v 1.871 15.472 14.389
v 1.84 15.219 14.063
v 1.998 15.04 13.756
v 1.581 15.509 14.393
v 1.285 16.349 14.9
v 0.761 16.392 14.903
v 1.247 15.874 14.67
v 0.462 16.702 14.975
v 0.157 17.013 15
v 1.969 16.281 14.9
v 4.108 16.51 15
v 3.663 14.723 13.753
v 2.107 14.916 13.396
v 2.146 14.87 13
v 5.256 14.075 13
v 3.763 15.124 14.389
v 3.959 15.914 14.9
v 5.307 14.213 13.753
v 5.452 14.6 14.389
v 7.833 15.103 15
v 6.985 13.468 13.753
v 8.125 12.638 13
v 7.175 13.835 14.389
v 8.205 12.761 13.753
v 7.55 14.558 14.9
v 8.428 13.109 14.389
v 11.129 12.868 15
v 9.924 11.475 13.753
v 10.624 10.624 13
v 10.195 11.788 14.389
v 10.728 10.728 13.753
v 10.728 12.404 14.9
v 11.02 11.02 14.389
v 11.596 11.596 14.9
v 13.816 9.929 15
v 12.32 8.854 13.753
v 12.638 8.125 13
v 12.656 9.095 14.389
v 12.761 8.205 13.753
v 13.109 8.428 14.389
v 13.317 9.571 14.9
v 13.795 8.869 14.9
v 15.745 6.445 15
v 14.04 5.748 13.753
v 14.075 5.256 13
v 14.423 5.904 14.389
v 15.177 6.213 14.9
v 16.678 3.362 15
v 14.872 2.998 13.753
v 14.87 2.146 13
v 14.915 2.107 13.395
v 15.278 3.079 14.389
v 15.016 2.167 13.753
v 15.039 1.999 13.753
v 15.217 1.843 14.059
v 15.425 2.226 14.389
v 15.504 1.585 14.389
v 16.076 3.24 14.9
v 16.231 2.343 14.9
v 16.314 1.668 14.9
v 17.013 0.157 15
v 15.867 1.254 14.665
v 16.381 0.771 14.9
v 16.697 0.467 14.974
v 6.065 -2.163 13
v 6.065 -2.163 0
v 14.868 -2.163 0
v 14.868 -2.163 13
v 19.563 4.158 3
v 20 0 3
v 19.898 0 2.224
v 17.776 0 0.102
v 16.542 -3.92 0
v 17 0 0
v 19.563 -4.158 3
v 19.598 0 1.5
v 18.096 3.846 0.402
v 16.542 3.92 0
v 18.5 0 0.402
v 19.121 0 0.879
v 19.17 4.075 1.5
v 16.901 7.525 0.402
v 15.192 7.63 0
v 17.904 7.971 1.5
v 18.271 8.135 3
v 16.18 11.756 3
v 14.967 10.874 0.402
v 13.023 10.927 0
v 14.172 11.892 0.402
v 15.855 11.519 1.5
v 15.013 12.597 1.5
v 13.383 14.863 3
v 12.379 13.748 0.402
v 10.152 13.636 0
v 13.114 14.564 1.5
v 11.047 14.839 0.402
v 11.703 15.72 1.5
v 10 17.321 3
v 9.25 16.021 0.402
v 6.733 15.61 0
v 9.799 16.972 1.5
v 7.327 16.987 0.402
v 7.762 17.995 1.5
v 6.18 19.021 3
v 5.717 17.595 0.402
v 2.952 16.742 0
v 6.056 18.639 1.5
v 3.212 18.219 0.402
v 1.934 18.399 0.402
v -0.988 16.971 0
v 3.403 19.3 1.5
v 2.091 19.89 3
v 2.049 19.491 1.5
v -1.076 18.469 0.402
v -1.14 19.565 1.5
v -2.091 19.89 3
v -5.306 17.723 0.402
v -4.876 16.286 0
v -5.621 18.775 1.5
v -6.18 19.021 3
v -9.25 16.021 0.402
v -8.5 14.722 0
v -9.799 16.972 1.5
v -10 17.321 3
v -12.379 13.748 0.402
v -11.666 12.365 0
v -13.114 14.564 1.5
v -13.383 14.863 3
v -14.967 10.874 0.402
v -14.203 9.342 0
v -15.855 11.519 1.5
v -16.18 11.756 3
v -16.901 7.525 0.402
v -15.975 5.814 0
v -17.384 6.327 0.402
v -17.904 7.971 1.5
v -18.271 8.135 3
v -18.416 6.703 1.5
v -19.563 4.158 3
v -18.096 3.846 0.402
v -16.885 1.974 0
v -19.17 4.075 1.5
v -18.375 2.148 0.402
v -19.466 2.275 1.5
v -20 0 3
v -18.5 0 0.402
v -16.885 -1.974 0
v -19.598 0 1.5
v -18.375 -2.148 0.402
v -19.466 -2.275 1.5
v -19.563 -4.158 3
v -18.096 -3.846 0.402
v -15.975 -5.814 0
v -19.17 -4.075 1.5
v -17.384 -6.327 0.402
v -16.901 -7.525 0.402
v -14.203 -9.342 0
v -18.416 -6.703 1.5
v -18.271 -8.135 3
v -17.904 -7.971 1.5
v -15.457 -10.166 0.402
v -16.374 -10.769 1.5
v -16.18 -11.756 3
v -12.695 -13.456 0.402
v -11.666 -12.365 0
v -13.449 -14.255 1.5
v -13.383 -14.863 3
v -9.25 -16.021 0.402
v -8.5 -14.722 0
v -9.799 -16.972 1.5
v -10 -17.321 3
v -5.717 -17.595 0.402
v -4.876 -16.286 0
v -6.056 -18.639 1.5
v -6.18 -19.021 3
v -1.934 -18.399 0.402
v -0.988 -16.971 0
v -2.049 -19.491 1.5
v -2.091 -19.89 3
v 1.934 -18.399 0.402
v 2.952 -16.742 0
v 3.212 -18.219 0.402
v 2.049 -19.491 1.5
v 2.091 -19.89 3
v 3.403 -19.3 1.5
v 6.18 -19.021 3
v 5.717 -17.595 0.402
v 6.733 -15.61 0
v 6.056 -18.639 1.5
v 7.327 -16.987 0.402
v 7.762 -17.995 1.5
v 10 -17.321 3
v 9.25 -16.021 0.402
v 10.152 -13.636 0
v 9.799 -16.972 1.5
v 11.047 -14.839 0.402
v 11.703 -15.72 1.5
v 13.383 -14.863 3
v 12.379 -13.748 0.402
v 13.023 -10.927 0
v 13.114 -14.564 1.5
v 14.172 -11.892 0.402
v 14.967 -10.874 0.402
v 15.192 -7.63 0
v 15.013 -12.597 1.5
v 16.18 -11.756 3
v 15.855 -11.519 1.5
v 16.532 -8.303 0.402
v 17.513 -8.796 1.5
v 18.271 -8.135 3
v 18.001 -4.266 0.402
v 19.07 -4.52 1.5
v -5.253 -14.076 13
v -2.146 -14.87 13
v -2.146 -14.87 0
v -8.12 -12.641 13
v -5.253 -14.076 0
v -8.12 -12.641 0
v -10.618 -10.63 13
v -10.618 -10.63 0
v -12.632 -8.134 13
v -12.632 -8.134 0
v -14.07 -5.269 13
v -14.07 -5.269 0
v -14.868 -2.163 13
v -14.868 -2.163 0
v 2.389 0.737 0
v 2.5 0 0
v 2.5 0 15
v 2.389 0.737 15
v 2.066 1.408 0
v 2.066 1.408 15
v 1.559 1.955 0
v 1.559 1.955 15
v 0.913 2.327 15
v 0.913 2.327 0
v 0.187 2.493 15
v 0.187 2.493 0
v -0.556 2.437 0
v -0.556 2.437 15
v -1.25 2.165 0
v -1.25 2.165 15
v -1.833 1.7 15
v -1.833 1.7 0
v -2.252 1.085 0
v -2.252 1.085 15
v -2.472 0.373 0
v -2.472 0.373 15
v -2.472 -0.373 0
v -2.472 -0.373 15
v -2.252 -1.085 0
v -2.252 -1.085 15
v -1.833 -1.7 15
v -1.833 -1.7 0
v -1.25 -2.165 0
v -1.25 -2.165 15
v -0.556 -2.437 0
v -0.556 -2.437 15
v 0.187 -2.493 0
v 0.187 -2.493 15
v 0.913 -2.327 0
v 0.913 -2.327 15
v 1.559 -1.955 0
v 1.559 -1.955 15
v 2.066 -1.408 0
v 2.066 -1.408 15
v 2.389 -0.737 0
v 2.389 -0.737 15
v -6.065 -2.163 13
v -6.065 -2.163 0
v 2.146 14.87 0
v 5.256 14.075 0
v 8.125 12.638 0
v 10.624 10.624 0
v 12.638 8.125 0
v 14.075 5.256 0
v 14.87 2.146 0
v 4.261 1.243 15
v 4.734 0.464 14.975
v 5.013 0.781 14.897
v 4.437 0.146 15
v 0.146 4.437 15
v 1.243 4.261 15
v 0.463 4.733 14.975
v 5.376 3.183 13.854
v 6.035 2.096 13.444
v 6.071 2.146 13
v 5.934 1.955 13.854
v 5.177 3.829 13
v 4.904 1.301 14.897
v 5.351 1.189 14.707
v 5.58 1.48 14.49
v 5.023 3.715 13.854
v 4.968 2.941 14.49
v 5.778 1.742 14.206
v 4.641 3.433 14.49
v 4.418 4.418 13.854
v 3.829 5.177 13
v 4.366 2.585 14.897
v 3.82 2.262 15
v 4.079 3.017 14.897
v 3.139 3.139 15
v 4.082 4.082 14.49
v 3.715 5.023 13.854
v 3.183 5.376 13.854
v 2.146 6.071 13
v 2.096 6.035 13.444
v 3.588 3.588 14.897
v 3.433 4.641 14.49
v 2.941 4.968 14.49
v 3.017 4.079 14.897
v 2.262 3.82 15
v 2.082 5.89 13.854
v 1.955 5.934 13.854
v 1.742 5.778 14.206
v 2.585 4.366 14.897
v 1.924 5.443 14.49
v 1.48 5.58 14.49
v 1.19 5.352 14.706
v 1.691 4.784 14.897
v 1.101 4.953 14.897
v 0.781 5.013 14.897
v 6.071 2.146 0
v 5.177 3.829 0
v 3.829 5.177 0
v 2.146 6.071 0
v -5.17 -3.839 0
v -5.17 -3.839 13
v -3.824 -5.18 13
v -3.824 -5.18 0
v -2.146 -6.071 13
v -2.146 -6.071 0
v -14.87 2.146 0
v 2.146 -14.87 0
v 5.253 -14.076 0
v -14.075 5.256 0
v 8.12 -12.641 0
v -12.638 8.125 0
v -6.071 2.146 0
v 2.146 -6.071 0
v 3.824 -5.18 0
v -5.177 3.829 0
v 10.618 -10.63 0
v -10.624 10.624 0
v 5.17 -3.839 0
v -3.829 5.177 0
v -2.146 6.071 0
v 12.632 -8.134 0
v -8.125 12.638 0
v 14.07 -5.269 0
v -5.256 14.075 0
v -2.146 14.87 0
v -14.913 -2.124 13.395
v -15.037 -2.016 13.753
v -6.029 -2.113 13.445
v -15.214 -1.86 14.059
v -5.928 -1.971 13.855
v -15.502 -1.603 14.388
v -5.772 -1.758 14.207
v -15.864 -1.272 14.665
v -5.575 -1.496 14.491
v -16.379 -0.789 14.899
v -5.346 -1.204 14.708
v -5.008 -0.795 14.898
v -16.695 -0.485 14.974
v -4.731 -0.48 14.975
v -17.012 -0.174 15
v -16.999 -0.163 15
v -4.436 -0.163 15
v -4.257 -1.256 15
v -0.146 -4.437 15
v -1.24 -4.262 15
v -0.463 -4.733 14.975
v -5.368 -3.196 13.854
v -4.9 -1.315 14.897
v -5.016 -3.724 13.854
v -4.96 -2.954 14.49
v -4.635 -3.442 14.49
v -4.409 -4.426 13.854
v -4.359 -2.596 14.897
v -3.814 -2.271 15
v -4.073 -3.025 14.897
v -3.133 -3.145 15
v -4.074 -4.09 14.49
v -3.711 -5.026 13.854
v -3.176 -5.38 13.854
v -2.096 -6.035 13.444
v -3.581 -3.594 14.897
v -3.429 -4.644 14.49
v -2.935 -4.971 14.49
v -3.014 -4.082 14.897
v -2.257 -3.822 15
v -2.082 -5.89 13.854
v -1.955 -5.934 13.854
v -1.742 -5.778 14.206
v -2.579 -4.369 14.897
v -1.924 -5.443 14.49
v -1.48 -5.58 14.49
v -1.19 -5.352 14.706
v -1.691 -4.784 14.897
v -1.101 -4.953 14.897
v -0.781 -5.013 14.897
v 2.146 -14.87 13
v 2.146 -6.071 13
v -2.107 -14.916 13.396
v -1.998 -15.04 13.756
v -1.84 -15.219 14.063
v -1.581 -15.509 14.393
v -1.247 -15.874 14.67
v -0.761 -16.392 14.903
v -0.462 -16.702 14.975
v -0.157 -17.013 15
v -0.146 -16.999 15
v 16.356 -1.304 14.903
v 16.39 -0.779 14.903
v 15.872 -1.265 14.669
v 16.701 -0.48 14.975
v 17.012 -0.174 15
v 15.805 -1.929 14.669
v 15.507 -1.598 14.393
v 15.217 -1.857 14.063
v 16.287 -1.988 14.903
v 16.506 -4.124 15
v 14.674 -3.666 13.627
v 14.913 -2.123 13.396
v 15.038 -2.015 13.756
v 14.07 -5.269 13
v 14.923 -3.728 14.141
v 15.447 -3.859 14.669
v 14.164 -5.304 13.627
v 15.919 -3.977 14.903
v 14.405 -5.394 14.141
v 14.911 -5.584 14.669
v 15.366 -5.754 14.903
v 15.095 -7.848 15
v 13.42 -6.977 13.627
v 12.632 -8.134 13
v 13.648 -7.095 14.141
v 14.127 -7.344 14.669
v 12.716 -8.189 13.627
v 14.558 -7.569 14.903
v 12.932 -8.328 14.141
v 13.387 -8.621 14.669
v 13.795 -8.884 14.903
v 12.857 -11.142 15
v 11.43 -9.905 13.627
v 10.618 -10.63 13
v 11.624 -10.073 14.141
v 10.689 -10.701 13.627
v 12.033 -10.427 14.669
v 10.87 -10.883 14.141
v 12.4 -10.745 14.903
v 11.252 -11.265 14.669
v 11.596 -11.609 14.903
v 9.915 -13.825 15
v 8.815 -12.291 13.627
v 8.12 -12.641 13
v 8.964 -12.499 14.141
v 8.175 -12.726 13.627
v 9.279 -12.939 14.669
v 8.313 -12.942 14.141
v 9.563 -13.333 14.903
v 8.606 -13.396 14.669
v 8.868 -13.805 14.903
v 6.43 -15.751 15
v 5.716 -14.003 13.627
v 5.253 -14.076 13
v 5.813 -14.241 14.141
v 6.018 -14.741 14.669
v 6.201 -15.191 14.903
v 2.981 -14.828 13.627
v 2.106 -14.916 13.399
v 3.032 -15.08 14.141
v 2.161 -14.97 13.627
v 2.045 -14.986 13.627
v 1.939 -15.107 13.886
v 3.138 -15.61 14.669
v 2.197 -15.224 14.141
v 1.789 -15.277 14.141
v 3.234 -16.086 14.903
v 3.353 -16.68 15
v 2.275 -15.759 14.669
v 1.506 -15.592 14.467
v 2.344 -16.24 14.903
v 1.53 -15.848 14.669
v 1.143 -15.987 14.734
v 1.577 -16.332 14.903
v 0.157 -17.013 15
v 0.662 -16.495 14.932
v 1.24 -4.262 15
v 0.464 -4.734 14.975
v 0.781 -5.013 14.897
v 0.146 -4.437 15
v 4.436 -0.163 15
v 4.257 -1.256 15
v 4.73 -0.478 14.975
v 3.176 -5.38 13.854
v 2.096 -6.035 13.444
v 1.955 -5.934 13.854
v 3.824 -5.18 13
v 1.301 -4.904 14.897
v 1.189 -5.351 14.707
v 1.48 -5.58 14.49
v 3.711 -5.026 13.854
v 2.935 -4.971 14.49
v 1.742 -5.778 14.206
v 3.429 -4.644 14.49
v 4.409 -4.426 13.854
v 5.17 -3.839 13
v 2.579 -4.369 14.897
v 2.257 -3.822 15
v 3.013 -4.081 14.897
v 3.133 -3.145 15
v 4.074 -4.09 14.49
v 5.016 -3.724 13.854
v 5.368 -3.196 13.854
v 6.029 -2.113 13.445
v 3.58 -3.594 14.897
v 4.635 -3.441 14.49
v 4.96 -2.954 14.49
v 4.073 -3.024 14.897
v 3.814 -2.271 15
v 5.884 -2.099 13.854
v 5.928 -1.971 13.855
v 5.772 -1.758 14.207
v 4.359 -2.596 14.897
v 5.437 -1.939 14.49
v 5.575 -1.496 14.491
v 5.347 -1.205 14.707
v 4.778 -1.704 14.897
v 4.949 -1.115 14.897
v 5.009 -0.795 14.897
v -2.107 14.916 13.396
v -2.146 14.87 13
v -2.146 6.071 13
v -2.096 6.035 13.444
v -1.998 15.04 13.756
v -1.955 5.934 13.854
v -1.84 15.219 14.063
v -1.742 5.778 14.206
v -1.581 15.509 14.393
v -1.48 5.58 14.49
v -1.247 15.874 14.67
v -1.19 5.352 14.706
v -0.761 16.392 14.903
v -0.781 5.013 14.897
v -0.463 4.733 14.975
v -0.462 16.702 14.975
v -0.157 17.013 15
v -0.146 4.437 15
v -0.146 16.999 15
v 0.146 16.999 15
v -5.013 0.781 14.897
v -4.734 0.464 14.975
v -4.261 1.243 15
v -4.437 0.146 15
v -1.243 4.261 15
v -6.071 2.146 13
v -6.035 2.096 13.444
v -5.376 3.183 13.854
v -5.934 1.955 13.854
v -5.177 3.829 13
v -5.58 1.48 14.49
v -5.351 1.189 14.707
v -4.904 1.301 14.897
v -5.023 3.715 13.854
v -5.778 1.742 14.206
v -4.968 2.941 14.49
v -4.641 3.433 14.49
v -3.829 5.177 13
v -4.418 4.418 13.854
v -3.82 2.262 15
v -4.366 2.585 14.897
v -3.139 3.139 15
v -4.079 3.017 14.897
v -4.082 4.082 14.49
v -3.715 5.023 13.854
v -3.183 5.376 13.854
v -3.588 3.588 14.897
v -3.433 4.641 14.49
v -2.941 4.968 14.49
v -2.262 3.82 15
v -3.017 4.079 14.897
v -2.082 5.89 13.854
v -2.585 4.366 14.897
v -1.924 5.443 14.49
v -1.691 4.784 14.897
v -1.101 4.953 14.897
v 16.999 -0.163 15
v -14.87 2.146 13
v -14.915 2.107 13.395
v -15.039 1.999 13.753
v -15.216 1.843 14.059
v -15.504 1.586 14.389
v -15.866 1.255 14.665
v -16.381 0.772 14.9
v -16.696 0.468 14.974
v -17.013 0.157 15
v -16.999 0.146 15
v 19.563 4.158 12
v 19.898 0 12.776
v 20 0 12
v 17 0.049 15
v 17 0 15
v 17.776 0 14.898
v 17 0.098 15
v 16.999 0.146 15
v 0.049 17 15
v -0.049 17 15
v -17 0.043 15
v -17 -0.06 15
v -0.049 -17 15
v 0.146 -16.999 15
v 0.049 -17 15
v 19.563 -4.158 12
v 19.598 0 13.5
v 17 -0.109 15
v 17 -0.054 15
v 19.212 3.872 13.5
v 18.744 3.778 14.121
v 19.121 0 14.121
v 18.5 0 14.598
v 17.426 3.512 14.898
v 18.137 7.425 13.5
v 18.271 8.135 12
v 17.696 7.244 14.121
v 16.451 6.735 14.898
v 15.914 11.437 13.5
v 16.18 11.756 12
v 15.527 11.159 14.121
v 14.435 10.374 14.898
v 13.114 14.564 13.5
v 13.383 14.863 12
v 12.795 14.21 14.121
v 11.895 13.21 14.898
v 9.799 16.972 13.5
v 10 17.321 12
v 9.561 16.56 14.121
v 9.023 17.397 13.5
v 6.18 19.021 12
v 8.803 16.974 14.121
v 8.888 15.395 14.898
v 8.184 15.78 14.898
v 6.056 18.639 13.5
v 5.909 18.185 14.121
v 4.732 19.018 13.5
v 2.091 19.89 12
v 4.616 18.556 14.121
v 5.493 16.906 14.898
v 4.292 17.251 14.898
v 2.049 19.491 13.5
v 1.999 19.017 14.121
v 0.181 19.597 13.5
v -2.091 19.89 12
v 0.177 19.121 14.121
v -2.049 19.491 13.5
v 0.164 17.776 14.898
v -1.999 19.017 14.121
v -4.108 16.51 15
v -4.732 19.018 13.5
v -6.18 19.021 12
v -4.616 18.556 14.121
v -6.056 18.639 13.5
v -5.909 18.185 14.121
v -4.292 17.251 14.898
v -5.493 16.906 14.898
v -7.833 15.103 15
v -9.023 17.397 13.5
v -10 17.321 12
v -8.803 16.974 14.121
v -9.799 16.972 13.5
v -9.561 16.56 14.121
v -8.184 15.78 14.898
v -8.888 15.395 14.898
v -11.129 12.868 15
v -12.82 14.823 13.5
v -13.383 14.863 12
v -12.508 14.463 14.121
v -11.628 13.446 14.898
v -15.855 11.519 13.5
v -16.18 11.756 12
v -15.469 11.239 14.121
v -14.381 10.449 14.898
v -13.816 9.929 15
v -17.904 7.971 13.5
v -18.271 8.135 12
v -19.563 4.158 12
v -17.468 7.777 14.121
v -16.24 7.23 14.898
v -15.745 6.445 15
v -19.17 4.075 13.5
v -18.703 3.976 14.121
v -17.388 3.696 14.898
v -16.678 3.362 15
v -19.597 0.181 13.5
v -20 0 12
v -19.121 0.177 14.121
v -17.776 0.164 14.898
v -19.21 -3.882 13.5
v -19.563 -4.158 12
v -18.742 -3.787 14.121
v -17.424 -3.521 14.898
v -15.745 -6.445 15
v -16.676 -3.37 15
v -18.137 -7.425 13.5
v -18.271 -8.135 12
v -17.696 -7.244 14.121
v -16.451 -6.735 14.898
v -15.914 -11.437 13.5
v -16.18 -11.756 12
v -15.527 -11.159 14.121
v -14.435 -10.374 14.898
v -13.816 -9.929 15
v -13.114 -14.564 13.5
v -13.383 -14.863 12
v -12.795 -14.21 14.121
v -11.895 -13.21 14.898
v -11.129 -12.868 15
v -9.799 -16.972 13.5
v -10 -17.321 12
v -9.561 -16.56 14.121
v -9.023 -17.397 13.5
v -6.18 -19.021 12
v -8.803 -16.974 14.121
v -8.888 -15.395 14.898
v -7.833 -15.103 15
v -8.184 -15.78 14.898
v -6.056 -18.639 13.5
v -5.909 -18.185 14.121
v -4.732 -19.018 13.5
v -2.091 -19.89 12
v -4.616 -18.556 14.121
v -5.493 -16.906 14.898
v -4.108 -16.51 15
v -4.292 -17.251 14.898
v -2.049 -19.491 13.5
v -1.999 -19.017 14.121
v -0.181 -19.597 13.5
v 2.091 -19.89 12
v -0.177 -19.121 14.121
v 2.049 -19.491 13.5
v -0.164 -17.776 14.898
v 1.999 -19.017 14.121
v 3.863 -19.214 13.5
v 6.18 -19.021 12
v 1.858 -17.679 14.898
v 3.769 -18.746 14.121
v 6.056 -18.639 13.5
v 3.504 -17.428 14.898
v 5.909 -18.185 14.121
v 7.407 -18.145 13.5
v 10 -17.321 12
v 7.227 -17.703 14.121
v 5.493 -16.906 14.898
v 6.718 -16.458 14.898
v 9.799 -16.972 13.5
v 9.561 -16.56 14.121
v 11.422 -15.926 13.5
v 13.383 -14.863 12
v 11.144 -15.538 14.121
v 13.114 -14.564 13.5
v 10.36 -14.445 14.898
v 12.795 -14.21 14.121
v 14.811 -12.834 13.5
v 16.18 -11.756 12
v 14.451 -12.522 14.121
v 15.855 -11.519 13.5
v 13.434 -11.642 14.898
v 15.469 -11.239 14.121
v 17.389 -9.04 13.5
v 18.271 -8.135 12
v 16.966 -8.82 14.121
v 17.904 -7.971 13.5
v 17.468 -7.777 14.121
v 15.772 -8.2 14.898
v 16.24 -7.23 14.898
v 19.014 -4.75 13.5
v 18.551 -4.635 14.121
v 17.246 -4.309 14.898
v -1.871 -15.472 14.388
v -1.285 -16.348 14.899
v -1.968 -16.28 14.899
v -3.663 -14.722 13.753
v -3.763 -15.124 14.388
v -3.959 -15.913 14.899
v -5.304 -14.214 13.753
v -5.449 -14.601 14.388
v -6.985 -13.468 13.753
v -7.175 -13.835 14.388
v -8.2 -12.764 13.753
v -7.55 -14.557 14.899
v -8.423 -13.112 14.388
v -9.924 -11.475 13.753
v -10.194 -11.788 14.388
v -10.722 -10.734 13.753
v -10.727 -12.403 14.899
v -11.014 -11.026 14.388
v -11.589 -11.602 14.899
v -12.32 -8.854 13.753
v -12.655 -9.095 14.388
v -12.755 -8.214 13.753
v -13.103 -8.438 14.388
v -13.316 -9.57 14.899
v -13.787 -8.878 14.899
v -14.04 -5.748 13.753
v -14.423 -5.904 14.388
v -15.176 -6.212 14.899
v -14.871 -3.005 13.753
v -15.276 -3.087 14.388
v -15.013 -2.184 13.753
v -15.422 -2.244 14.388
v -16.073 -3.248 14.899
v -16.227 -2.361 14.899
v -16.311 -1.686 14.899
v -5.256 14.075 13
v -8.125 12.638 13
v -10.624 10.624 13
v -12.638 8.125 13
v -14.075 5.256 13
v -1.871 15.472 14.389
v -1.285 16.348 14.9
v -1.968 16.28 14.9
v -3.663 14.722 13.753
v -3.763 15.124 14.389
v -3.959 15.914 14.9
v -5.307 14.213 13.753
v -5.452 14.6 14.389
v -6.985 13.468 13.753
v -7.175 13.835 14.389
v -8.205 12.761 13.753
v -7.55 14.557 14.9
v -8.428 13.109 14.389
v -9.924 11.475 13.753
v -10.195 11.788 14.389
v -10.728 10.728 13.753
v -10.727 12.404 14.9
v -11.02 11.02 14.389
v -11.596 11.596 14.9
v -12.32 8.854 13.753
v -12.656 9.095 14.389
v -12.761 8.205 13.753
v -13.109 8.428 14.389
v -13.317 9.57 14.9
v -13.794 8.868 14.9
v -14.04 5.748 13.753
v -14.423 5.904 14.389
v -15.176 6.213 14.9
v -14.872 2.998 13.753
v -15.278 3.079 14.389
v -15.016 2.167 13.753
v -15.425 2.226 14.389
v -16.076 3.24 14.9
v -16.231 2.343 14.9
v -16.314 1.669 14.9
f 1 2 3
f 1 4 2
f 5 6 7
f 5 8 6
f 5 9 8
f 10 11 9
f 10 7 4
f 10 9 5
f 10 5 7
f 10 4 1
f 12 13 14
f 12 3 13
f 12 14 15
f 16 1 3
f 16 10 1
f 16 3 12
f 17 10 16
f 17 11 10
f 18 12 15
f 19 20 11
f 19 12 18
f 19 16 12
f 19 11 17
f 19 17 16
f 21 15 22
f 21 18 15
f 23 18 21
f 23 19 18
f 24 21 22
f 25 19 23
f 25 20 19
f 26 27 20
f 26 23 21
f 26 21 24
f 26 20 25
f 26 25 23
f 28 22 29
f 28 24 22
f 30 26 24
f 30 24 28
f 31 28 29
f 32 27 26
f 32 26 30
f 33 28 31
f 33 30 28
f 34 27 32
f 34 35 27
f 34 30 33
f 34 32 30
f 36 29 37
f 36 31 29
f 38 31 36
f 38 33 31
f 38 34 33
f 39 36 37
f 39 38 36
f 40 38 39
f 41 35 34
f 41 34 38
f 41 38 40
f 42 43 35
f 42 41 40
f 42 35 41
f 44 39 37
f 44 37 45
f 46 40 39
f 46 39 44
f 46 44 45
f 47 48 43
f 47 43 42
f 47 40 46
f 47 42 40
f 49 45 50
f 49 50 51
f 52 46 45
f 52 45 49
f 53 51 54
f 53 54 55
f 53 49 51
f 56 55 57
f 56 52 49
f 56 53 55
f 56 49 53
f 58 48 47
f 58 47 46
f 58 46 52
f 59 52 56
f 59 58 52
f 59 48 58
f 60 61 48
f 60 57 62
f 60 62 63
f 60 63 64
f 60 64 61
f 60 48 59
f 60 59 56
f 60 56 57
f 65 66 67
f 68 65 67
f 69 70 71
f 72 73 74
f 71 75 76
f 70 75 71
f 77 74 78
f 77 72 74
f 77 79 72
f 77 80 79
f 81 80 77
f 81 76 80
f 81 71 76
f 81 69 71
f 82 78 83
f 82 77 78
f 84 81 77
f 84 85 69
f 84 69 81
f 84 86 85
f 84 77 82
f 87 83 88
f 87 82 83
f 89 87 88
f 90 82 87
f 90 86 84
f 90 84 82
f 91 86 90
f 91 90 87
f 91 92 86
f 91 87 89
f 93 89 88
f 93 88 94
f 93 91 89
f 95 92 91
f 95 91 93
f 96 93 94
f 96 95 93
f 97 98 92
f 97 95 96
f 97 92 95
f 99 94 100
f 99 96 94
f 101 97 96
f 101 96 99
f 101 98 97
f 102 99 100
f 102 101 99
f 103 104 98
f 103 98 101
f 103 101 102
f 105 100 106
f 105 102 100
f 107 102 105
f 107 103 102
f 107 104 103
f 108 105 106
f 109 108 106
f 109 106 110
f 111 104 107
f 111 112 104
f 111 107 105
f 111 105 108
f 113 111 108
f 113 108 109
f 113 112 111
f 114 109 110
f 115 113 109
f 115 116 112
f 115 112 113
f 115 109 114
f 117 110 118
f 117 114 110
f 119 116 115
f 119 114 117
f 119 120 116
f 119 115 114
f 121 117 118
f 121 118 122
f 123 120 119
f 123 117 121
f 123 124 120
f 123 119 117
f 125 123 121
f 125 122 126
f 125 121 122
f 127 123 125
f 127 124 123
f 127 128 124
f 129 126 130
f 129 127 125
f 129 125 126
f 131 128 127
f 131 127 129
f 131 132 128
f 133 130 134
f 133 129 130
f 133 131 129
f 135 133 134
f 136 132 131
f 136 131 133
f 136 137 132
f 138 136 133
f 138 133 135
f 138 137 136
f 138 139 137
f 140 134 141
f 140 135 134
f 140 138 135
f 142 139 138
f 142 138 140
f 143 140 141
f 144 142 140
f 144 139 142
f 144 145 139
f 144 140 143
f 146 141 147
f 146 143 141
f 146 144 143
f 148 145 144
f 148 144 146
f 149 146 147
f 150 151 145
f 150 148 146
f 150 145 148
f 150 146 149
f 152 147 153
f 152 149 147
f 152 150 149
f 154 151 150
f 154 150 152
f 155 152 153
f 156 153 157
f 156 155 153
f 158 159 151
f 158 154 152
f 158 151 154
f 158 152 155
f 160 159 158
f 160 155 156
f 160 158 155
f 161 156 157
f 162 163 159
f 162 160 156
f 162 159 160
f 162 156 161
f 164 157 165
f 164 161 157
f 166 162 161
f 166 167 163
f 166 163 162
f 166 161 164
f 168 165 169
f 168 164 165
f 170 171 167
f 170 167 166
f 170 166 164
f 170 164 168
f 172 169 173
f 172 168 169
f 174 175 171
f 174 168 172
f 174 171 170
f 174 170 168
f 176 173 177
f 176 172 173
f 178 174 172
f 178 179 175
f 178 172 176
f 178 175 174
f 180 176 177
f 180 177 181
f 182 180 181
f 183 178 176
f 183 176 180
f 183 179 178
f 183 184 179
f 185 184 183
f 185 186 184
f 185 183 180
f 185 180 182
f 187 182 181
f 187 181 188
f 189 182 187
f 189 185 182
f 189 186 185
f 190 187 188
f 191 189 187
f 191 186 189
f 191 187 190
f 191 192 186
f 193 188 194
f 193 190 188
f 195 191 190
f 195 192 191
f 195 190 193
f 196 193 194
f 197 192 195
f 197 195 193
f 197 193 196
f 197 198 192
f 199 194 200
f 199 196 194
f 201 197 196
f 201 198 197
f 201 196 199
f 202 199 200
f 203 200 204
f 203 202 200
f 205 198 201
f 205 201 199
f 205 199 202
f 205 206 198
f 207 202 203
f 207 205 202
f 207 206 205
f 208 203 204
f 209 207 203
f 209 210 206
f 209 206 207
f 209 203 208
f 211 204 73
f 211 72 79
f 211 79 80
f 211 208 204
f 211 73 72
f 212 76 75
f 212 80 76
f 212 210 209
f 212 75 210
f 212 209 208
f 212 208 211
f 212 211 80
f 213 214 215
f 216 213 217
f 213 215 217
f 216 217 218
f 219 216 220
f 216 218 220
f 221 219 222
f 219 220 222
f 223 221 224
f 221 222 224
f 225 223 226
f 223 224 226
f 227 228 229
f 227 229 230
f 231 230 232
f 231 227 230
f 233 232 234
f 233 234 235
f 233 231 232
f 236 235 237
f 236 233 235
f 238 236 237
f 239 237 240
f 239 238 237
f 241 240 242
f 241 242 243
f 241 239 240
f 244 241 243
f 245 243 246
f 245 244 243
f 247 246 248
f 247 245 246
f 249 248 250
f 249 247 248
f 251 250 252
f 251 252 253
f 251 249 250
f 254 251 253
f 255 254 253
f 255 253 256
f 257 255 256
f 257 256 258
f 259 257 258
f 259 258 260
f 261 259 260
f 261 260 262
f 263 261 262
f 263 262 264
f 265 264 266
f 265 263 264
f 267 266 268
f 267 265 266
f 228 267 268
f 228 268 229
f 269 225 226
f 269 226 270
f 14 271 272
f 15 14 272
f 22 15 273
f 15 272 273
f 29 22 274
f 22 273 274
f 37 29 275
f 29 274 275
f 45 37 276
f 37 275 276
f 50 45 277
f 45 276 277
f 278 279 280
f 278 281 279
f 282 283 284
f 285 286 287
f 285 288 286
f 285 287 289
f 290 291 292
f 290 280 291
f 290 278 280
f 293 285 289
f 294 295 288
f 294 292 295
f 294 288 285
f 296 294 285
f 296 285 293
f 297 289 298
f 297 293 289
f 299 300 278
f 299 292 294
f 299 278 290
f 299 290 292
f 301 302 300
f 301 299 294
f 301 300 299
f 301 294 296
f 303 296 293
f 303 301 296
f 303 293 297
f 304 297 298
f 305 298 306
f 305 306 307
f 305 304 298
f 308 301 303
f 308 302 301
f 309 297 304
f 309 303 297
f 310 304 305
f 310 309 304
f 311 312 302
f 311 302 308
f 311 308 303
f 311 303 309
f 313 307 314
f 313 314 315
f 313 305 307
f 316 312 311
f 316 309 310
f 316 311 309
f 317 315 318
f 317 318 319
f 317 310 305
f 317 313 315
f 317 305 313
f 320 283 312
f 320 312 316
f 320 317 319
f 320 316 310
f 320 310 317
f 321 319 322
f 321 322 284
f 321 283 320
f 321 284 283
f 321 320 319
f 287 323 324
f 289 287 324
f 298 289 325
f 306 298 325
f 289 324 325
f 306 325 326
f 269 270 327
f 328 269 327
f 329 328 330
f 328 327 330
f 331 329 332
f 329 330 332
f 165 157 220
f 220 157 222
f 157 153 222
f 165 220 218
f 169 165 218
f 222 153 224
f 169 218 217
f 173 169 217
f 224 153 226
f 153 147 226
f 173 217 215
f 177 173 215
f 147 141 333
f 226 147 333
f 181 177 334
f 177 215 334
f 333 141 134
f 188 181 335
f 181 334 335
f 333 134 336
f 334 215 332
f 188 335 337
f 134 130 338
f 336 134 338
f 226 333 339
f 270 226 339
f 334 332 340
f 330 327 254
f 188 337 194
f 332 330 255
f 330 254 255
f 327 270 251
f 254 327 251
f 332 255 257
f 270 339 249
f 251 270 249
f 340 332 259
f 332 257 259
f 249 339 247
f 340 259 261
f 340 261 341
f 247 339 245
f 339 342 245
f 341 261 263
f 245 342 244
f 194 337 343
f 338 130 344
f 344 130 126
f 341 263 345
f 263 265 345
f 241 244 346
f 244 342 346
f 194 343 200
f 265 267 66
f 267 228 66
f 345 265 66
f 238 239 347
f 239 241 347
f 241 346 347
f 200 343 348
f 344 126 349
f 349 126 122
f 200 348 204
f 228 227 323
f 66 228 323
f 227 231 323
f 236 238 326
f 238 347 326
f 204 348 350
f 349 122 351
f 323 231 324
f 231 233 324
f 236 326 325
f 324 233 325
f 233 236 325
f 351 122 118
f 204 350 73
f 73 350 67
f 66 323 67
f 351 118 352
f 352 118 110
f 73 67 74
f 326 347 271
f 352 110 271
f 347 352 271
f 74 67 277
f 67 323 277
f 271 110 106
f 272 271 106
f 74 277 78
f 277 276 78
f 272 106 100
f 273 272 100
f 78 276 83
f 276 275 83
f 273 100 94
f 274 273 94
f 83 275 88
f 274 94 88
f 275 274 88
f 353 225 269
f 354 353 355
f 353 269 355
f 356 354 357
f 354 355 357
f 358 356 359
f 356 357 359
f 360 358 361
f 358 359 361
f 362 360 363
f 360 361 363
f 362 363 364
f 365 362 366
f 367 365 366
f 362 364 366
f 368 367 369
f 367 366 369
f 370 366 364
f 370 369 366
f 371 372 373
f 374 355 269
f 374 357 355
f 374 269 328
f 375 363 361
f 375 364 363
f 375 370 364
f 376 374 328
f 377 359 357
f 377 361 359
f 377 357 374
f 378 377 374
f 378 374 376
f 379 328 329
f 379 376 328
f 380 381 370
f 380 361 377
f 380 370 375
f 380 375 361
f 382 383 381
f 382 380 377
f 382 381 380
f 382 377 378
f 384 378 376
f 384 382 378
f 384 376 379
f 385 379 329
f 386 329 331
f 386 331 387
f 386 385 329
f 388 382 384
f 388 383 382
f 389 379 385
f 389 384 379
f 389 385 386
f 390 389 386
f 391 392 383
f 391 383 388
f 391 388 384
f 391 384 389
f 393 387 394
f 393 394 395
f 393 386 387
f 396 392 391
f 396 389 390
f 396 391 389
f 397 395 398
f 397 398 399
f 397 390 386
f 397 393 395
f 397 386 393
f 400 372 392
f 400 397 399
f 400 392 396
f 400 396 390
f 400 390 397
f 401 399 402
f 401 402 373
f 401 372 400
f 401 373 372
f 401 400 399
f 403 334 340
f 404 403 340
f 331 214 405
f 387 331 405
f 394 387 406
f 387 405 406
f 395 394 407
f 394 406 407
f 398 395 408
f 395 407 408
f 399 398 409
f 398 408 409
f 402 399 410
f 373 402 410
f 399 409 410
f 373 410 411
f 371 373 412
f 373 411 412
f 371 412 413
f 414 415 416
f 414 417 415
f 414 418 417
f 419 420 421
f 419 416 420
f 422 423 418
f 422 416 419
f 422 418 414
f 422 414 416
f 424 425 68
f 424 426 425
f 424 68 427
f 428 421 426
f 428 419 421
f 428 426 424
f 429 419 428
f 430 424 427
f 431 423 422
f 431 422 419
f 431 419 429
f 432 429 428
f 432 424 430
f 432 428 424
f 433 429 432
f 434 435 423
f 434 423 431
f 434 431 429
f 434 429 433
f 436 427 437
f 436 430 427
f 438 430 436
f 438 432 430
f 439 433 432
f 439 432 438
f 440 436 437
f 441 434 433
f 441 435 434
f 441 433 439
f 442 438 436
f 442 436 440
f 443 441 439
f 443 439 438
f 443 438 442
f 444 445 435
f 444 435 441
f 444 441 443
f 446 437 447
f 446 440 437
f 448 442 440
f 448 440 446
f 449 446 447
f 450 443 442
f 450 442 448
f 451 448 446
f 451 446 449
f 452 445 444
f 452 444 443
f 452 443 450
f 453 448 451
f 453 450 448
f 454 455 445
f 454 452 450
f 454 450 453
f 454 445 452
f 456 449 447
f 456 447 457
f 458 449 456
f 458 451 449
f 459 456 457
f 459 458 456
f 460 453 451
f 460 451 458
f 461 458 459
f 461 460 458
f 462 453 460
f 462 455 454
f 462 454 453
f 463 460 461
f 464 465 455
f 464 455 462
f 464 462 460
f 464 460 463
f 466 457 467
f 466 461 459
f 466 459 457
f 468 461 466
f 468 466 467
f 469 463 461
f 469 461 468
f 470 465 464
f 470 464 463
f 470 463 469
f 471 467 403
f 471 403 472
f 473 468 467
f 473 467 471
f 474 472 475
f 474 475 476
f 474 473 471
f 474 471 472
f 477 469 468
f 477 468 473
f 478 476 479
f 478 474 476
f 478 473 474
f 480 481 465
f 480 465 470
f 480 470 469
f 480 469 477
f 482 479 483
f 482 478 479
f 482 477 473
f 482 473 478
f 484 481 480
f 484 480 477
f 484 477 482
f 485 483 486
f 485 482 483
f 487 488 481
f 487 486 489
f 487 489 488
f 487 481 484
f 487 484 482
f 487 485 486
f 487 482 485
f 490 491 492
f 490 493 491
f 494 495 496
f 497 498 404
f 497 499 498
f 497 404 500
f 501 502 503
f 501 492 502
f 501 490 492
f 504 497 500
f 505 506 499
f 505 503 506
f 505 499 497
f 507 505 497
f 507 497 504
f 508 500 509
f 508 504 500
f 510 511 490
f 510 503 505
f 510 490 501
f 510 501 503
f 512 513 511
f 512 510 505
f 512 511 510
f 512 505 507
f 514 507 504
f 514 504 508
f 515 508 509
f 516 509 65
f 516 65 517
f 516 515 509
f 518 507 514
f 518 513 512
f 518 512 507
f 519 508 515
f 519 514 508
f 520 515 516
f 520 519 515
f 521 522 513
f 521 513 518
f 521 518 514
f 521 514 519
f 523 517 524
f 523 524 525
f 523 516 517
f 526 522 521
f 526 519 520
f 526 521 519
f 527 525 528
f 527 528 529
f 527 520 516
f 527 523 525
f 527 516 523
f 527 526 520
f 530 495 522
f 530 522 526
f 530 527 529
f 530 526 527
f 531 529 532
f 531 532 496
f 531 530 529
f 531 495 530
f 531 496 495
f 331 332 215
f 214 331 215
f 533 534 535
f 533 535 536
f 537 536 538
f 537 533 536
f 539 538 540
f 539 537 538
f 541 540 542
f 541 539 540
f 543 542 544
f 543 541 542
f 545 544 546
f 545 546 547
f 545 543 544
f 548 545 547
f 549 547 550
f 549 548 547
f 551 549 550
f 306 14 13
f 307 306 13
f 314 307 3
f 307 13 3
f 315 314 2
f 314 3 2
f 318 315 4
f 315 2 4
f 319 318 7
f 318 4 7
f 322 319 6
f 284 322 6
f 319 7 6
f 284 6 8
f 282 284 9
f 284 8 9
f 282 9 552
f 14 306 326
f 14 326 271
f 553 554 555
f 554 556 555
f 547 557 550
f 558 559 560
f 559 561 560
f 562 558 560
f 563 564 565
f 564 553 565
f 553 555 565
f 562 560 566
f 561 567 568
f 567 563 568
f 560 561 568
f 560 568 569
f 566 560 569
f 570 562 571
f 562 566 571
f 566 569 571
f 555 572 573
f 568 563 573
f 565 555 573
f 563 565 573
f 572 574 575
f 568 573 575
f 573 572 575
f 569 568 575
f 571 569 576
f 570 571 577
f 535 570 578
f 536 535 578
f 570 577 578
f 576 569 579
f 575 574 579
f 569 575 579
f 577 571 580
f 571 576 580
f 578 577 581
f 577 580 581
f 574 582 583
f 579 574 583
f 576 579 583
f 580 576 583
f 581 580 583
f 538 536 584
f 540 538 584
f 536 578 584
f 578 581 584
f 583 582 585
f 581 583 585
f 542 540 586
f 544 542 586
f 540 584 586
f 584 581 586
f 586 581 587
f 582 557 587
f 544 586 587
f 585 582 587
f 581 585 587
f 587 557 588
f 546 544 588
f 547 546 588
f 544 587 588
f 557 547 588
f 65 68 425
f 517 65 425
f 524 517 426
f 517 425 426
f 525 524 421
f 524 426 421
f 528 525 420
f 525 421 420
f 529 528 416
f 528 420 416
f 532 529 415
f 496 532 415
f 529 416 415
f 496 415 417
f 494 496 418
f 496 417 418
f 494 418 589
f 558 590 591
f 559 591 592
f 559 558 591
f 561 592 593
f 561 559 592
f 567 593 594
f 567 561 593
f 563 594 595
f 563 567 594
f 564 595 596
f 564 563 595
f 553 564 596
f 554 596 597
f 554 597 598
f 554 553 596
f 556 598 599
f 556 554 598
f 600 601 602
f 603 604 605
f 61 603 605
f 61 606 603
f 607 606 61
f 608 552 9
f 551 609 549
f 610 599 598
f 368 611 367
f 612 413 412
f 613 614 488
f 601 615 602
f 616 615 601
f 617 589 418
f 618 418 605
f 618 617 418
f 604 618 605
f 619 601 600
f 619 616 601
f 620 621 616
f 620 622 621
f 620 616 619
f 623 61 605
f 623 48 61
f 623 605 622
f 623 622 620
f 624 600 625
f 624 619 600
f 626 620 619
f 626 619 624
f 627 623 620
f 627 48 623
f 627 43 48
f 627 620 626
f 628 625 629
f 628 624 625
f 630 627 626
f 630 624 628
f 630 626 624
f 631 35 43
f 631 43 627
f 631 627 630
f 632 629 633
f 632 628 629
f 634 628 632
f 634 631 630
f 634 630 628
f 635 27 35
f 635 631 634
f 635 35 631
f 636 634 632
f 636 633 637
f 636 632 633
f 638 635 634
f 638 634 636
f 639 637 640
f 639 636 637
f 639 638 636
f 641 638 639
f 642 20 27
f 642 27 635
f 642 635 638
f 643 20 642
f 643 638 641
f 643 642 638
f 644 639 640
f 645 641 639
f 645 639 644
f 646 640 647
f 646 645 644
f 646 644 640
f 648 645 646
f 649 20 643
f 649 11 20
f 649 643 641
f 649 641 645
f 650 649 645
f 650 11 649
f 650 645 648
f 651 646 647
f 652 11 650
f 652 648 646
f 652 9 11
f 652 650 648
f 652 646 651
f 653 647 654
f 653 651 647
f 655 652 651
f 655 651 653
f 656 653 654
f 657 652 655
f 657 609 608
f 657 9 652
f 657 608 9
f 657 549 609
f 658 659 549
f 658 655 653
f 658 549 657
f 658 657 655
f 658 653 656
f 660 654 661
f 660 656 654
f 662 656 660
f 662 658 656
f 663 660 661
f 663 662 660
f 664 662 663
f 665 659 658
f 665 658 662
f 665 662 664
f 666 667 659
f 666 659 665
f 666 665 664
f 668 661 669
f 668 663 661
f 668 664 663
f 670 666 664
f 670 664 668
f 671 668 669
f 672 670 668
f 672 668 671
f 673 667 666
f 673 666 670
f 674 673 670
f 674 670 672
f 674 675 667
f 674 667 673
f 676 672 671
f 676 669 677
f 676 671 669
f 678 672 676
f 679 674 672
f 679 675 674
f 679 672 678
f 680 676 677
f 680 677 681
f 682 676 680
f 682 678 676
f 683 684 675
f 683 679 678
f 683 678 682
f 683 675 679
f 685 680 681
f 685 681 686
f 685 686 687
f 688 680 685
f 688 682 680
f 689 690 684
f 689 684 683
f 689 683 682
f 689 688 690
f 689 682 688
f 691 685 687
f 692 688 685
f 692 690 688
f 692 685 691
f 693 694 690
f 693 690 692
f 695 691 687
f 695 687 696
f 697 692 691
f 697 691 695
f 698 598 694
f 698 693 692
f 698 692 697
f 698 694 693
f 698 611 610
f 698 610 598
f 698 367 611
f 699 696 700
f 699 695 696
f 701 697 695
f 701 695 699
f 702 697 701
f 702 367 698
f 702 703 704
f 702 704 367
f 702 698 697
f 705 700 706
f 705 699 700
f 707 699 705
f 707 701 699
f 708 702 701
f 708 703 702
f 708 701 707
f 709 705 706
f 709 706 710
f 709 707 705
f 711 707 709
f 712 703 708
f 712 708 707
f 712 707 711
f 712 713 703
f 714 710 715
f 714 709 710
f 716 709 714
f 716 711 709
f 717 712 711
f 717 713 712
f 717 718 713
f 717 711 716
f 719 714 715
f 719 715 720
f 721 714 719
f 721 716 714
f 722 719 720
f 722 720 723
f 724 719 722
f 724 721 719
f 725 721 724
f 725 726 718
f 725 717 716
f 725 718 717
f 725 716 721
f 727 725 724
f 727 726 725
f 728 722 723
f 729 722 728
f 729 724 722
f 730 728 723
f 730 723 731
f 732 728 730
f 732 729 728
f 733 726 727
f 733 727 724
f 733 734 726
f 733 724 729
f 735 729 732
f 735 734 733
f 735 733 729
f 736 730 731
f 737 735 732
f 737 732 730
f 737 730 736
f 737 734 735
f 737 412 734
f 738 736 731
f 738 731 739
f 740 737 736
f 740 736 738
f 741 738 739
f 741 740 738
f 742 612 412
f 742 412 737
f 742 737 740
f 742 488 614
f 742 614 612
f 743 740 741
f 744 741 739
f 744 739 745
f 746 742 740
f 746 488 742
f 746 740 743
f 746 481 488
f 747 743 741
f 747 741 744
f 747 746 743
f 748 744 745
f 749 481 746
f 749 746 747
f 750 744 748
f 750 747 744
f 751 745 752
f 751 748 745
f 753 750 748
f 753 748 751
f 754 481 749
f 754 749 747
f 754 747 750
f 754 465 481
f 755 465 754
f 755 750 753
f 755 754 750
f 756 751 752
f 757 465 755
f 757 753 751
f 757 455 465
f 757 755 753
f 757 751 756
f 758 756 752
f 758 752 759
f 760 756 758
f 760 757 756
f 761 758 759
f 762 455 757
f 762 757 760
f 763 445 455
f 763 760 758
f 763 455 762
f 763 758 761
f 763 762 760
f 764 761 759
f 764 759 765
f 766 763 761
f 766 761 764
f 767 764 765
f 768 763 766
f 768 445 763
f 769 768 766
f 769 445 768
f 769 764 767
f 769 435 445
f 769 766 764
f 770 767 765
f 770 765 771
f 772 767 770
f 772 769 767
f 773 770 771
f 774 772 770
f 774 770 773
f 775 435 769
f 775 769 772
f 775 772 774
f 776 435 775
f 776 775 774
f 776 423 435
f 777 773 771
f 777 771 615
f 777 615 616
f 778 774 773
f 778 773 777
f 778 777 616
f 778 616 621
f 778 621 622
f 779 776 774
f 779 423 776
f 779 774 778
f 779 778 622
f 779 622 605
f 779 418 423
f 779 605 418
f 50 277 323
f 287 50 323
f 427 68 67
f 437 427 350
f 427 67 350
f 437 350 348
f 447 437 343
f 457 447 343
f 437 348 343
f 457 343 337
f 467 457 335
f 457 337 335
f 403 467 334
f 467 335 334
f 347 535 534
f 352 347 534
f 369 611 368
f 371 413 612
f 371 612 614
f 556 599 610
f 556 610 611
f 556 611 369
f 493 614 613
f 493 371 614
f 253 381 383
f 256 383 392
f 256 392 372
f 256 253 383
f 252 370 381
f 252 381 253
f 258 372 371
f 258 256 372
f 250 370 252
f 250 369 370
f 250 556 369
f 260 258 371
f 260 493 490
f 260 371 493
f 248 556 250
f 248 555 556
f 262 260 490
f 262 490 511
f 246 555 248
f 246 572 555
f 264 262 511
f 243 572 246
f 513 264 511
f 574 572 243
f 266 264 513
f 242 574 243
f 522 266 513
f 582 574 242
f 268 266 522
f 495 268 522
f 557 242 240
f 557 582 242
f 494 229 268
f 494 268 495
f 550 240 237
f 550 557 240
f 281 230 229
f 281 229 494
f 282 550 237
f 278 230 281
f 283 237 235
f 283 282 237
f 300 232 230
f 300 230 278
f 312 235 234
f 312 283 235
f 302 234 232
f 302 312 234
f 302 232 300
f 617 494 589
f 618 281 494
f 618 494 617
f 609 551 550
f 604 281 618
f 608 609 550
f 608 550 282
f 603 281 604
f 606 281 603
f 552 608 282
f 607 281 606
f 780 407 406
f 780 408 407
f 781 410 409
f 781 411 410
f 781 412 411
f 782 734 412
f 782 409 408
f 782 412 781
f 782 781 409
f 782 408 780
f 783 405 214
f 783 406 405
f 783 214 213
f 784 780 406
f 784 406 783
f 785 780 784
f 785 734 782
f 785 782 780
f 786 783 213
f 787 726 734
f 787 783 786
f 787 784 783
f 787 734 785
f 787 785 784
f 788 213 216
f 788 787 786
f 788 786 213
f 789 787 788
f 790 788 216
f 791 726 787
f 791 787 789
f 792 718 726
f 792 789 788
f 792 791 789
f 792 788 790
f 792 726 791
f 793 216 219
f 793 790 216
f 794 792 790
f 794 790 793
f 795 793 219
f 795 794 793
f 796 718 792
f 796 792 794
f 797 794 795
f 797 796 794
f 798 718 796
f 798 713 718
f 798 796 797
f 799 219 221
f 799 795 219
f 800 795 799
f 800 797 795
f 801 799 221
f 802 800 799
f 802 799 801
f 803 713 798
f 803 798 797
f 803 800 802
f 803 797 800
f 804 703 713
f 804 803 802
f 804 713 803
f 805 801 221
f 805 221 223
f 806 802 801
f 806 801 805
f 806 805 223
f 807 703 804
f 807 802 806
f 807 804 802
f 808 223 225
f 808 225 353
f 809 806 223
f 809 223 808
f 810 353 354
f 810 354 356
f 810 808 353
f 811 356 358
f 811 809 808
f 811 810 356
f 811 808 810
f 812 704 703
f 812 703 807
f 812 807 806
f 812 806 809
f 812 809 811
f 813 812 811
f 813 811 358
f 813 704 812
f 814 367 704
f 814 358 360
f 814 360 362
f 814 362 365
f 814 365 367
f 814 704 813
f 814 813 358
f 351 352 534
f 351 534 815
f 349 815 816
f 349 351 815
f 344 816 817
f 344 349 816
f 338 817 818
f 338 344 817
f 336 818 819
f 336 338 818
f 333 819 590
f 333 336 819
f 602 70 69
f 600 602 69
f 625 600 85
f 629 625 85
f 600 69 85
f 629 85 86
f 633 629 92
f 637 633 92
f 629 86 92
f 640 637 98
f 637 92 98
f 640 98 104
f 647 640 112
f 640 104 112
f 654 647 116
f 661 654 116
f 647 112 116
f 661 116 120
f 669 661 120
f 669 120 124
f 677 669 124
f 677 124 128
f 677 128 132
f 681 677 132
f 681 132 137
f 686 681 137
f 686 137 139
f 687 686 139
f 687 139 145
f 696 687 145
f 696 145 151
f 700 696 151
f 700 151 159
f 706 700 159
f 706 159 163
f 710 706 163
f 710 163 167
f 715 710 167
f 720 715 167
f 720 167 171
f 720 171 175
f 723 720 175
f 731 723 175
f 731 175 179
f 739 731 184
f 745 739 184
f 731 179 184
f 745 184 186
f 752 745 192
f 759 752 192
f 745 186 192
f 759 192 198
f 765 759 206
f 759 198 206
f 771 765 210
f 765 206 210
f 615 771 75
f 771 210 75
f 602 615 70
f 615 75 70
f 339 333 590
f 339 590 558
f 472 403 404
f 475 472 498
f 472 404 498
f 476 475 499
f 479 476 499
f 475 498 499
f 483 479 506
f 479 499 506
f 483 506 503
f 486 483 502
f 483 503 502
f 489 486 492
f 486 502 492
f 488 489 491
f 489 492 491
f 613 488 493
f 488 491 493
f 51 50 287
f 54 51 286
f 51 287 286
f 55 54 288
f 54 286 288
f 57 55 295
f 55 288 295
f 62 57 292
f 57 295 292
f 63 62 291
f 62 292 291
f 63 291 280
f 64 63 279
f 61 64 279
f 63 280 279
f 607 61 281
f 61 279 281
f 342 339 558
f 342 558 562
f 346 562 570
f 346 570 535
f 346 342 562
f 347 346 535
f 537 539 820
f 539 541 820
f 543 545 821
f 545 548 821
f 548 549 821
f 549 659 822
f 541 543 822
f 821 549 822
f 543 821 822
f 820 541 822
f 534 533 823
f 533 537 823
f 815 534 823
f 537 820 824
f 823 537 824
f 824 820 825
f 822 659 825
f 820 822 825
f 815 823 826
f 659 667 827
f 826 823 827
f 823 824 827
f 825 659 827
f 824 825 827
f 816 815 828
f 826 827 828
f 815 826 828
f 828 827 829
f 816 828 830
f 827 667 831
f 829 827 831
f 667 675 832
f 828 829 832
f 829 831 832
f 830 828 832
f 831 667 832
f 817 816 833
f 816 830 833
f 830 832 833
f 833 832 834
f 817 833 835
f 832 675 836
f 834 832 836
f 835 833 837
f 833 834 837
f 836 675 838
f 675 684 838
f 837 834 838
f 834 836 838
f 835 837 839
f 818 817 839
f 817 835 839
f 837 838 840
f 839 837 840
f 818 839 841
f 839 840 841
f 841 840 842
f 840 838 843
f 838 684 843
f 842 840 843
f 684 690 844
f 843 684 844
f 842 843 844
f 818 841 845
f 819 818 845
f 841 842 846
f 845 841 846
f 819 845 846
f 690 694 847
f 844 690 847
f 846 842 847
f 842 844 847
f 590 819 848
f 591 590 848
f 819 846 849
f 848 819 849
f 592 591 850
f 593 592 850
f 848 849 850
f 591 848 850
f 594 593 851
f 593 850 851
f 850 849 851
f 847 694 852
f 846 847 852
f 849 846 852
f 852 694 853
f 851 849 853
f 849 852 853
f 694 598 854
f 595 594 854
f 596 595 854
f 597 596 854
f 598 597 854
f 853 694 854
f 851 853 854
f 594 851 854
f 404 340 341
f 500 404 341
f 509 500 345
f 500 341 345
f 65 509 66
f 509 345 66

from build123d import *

# Parameters (mm, degrees)
SKETCH2_R           = 20
SKETCH2_R_2         = 2.5
BOSS_EXTRUDE1_DEPTH = 15
SKETCH3_R           = 2.41667892
BOSS_EXTRUDE2_DEPTH = 15
FILLET2_R           = 2
FILLET3_R           = 3
SKETCH4_R           = 2.46809762
CUT_EXTRUDE1_DEPTH  = 7.5
CUT_EXTRUDE2_START  = -10
SKETCH5_R           = 2.5
CUT_EXTRUDE2_DEPTH  = 10


with BuildPart() as part:
    # Sketch2 → Boss-Extrude1 (new body)
    with BuildSketch(Plane.XY):
        Circle(SKETCH2_R)
        Circle(SKETCH2_R_2, mode=Mode.SUBTRACT)
        with BuildLine():
            Line((-2.146310324, 6.070682338), (-2.146310324, 14.870074118))
            ThreePointArc((-2.146310324, 14.870074118), (-10.623694091, 10.623694091), (-14.870074118, 2.146310324))
            Line((-14.870074118, 2.146310324), (-6.070682338, 2.146310324))
            ThreePointArc((-6.070682338, 2.146310324), (-4.553011753, 4.553011753), (-2.146310324, 6.070682338))
        make_face(mode=Mode.SUBTRACT)
        with BuildLine():
            Line((2.146310324, 6.070682338), (2.146310324, 14.870074118))
            ThreePointArc((2.146310324, 14.870074118), (10.623694091, 10.623694091), (14.870074118, 2.146310324))
            Line((14.870074118, 2.146310324), (6.070682338, 2.146310324))
            ThreePointArc((6.070682338, 2.146310324), (4.553011753, 4.553011753), (2.146310324, 6.070682338))
        make_face(mode=Mode.SUBTRACT)
        with BuildLine():
            Line((6.064732431, -2.163065556), (14.867646071, -2.163065556))
            ThreePointArc((14.867646071, -2.163065556), (10.617706659, -10.629678151), (2.146310324, -14.870074118))
            Line((2.146310324, -14.870074118), (2.146310324, -6.070682338))
            ThreePointArc((2.146310324, -6.070682338), (4.546721127, -4.5592937), (6.064732431, -2.163065556))
        make_face(mode=Mode.SUBTRACT)
        with BuildLine():
            Line((-2.146310324, -6.070682338), (-2.146310324, -14.870074118))
            ThreePointArc((-2.146310324, -14.870074118), (-10.617706659, -10.629678151), (-14.867646071, -2.163065556))
            Line((-14.867646071, -2.163065556), (-6.064732431, -2.163065556))
            ThreePointArc((-6.064732431, -2.163065556), (-4.546721127, -4.5592937), (-2.146310324, -6.070682338))
        make_face(mode=Mode.SUBTRACT)
    extrude(amount=BOSS_EXTRUDE1_DEPTH)

    # Fillet2
    fillet2_edges = [part.edges().sort_by_distance(p)[0] for p in [
        (10.470378228, 2.146310324, 15),
        (-10.470378228, 2.146310324, 15),
        (-10.623694091, 10.623694091, 15),
        (-2.146310324, 10.470378228, 15),
        (4.553011753, 4.553011753, 15),
        (2.146310324, 10.470378228, 15),
        (10.623694091, 10.623694091, 15),
        (2.146310324, -10.470378228, 15),
        (4.546721127, -4.5592937, 15),
        (10.466189251, -2.163065556, 15),
        (10.617706659, -10.629678151, 15),
        (-10.466189251, -2.163065556, 15),
        (-4.546721127, -4.5592937, 15),
        (-2.146310324, -10.470378228, 15),
        (-10.617706659, -10.629678151, 15),
        (-4.553011753, 4.553011753, 15),
    ]]
    fillet(fillet2_edges, radius=FILLET2_R)

    # Fillet3
    # the kernel refuses this fillet: 3 mm, written as the material it takes off along each edge
    with BuildSketch(Plane(origin=(0, 0, 15), x_dir=(1, 0, 0), z_dir=(0, -1, 0))) as fillet3_piece_1:
        with BuildLine():
            CenterArc((20 - FILLET3_R, -FILLET3_R), FILLET3_R, 0, 90)
            Line((20, -FILLET3_R), (20 + FILLET3_R * 0.02, -FILLET3_R))
            Line((20 + FILLET3_R * 0.02, -FILLET3_R), (20 + FILLET3_R * 0.02, FILLET3_R * 0.02))
            Line((20 + FILLET3_R * 0.02, FILLET3_R * 0.02), (20 - FILLET3_R, FILLET3_R * 0.02))
            Line((20 - FILLET3_R, FILLET3_R * 0.02), (20 - FILLET3_R, 0))
        make_face()
    revolve(axis=Axis((0, 0, 15), (0, 0, 1)), mode=Mode.SUBTRACT)
    with BuildSketch(Plane(origin=(0, 0, 0), x_dir=(1, 0, 0), z_dir=(0, -1, 0))) as fillet3_piece_2:
        with BuildLine():
            CenterArc((20 - FILLET3_R, FILLET3_R), FILLET3_R, 270, 90)
            Line((20, FILLET3_R), (20 + FILLET3_R * 0.02, FILLET3_R))
            Line((20 + FILLET3_R * 0.02, FILLET3_R), (20 + FILLET3_R * 0.02, -FILLET3_R * 0.02))
            Line((20 + FILLET3_R * 0.02, -FILLET3_R * 0.02), (20 - FILLET3_R, -FILLET3_R * 0.02))
            Line((20 - FILLET3_R, -FILLET3_R * 0.02), (20 - FILLET3_R, 0))
        make_face()
    revolve(axis=Axis((0, 0, 0), (0, 0, 1)), mode=Mode.SUBTRACT)


with BuildPart() as body_2:
    # Sketch3 → Boss-Extrude2 (new body)
    with BuildSketch(Plane.XY.offset(15)):
        Circle(SKETCH3_R)
    extrude(amount=-BOSS_EXTRUDE2_DEPTH)

    # Sketch4 → Cut-Extrude1 (cut)
    with BuildSketch(Plane.XY.offset(15)):
        Circle(SKETCH4_R)
    extrude(amount=-CUT_EXTRUDE1_DEPTH, mode=Mode.SUBTRACT)

    # Sketch5 → Cut-Extrude2 (cut)
    with BuildSketch(Plane.XY.offset(7.5).offset(CUT_EXTRUDE2_START)):
        Circle(SKETCH5_R)
    extrude(amount=CUT_EXTRUDE2_DEPTH, mode=Mode.SUBTRACT)


solid = part.part
